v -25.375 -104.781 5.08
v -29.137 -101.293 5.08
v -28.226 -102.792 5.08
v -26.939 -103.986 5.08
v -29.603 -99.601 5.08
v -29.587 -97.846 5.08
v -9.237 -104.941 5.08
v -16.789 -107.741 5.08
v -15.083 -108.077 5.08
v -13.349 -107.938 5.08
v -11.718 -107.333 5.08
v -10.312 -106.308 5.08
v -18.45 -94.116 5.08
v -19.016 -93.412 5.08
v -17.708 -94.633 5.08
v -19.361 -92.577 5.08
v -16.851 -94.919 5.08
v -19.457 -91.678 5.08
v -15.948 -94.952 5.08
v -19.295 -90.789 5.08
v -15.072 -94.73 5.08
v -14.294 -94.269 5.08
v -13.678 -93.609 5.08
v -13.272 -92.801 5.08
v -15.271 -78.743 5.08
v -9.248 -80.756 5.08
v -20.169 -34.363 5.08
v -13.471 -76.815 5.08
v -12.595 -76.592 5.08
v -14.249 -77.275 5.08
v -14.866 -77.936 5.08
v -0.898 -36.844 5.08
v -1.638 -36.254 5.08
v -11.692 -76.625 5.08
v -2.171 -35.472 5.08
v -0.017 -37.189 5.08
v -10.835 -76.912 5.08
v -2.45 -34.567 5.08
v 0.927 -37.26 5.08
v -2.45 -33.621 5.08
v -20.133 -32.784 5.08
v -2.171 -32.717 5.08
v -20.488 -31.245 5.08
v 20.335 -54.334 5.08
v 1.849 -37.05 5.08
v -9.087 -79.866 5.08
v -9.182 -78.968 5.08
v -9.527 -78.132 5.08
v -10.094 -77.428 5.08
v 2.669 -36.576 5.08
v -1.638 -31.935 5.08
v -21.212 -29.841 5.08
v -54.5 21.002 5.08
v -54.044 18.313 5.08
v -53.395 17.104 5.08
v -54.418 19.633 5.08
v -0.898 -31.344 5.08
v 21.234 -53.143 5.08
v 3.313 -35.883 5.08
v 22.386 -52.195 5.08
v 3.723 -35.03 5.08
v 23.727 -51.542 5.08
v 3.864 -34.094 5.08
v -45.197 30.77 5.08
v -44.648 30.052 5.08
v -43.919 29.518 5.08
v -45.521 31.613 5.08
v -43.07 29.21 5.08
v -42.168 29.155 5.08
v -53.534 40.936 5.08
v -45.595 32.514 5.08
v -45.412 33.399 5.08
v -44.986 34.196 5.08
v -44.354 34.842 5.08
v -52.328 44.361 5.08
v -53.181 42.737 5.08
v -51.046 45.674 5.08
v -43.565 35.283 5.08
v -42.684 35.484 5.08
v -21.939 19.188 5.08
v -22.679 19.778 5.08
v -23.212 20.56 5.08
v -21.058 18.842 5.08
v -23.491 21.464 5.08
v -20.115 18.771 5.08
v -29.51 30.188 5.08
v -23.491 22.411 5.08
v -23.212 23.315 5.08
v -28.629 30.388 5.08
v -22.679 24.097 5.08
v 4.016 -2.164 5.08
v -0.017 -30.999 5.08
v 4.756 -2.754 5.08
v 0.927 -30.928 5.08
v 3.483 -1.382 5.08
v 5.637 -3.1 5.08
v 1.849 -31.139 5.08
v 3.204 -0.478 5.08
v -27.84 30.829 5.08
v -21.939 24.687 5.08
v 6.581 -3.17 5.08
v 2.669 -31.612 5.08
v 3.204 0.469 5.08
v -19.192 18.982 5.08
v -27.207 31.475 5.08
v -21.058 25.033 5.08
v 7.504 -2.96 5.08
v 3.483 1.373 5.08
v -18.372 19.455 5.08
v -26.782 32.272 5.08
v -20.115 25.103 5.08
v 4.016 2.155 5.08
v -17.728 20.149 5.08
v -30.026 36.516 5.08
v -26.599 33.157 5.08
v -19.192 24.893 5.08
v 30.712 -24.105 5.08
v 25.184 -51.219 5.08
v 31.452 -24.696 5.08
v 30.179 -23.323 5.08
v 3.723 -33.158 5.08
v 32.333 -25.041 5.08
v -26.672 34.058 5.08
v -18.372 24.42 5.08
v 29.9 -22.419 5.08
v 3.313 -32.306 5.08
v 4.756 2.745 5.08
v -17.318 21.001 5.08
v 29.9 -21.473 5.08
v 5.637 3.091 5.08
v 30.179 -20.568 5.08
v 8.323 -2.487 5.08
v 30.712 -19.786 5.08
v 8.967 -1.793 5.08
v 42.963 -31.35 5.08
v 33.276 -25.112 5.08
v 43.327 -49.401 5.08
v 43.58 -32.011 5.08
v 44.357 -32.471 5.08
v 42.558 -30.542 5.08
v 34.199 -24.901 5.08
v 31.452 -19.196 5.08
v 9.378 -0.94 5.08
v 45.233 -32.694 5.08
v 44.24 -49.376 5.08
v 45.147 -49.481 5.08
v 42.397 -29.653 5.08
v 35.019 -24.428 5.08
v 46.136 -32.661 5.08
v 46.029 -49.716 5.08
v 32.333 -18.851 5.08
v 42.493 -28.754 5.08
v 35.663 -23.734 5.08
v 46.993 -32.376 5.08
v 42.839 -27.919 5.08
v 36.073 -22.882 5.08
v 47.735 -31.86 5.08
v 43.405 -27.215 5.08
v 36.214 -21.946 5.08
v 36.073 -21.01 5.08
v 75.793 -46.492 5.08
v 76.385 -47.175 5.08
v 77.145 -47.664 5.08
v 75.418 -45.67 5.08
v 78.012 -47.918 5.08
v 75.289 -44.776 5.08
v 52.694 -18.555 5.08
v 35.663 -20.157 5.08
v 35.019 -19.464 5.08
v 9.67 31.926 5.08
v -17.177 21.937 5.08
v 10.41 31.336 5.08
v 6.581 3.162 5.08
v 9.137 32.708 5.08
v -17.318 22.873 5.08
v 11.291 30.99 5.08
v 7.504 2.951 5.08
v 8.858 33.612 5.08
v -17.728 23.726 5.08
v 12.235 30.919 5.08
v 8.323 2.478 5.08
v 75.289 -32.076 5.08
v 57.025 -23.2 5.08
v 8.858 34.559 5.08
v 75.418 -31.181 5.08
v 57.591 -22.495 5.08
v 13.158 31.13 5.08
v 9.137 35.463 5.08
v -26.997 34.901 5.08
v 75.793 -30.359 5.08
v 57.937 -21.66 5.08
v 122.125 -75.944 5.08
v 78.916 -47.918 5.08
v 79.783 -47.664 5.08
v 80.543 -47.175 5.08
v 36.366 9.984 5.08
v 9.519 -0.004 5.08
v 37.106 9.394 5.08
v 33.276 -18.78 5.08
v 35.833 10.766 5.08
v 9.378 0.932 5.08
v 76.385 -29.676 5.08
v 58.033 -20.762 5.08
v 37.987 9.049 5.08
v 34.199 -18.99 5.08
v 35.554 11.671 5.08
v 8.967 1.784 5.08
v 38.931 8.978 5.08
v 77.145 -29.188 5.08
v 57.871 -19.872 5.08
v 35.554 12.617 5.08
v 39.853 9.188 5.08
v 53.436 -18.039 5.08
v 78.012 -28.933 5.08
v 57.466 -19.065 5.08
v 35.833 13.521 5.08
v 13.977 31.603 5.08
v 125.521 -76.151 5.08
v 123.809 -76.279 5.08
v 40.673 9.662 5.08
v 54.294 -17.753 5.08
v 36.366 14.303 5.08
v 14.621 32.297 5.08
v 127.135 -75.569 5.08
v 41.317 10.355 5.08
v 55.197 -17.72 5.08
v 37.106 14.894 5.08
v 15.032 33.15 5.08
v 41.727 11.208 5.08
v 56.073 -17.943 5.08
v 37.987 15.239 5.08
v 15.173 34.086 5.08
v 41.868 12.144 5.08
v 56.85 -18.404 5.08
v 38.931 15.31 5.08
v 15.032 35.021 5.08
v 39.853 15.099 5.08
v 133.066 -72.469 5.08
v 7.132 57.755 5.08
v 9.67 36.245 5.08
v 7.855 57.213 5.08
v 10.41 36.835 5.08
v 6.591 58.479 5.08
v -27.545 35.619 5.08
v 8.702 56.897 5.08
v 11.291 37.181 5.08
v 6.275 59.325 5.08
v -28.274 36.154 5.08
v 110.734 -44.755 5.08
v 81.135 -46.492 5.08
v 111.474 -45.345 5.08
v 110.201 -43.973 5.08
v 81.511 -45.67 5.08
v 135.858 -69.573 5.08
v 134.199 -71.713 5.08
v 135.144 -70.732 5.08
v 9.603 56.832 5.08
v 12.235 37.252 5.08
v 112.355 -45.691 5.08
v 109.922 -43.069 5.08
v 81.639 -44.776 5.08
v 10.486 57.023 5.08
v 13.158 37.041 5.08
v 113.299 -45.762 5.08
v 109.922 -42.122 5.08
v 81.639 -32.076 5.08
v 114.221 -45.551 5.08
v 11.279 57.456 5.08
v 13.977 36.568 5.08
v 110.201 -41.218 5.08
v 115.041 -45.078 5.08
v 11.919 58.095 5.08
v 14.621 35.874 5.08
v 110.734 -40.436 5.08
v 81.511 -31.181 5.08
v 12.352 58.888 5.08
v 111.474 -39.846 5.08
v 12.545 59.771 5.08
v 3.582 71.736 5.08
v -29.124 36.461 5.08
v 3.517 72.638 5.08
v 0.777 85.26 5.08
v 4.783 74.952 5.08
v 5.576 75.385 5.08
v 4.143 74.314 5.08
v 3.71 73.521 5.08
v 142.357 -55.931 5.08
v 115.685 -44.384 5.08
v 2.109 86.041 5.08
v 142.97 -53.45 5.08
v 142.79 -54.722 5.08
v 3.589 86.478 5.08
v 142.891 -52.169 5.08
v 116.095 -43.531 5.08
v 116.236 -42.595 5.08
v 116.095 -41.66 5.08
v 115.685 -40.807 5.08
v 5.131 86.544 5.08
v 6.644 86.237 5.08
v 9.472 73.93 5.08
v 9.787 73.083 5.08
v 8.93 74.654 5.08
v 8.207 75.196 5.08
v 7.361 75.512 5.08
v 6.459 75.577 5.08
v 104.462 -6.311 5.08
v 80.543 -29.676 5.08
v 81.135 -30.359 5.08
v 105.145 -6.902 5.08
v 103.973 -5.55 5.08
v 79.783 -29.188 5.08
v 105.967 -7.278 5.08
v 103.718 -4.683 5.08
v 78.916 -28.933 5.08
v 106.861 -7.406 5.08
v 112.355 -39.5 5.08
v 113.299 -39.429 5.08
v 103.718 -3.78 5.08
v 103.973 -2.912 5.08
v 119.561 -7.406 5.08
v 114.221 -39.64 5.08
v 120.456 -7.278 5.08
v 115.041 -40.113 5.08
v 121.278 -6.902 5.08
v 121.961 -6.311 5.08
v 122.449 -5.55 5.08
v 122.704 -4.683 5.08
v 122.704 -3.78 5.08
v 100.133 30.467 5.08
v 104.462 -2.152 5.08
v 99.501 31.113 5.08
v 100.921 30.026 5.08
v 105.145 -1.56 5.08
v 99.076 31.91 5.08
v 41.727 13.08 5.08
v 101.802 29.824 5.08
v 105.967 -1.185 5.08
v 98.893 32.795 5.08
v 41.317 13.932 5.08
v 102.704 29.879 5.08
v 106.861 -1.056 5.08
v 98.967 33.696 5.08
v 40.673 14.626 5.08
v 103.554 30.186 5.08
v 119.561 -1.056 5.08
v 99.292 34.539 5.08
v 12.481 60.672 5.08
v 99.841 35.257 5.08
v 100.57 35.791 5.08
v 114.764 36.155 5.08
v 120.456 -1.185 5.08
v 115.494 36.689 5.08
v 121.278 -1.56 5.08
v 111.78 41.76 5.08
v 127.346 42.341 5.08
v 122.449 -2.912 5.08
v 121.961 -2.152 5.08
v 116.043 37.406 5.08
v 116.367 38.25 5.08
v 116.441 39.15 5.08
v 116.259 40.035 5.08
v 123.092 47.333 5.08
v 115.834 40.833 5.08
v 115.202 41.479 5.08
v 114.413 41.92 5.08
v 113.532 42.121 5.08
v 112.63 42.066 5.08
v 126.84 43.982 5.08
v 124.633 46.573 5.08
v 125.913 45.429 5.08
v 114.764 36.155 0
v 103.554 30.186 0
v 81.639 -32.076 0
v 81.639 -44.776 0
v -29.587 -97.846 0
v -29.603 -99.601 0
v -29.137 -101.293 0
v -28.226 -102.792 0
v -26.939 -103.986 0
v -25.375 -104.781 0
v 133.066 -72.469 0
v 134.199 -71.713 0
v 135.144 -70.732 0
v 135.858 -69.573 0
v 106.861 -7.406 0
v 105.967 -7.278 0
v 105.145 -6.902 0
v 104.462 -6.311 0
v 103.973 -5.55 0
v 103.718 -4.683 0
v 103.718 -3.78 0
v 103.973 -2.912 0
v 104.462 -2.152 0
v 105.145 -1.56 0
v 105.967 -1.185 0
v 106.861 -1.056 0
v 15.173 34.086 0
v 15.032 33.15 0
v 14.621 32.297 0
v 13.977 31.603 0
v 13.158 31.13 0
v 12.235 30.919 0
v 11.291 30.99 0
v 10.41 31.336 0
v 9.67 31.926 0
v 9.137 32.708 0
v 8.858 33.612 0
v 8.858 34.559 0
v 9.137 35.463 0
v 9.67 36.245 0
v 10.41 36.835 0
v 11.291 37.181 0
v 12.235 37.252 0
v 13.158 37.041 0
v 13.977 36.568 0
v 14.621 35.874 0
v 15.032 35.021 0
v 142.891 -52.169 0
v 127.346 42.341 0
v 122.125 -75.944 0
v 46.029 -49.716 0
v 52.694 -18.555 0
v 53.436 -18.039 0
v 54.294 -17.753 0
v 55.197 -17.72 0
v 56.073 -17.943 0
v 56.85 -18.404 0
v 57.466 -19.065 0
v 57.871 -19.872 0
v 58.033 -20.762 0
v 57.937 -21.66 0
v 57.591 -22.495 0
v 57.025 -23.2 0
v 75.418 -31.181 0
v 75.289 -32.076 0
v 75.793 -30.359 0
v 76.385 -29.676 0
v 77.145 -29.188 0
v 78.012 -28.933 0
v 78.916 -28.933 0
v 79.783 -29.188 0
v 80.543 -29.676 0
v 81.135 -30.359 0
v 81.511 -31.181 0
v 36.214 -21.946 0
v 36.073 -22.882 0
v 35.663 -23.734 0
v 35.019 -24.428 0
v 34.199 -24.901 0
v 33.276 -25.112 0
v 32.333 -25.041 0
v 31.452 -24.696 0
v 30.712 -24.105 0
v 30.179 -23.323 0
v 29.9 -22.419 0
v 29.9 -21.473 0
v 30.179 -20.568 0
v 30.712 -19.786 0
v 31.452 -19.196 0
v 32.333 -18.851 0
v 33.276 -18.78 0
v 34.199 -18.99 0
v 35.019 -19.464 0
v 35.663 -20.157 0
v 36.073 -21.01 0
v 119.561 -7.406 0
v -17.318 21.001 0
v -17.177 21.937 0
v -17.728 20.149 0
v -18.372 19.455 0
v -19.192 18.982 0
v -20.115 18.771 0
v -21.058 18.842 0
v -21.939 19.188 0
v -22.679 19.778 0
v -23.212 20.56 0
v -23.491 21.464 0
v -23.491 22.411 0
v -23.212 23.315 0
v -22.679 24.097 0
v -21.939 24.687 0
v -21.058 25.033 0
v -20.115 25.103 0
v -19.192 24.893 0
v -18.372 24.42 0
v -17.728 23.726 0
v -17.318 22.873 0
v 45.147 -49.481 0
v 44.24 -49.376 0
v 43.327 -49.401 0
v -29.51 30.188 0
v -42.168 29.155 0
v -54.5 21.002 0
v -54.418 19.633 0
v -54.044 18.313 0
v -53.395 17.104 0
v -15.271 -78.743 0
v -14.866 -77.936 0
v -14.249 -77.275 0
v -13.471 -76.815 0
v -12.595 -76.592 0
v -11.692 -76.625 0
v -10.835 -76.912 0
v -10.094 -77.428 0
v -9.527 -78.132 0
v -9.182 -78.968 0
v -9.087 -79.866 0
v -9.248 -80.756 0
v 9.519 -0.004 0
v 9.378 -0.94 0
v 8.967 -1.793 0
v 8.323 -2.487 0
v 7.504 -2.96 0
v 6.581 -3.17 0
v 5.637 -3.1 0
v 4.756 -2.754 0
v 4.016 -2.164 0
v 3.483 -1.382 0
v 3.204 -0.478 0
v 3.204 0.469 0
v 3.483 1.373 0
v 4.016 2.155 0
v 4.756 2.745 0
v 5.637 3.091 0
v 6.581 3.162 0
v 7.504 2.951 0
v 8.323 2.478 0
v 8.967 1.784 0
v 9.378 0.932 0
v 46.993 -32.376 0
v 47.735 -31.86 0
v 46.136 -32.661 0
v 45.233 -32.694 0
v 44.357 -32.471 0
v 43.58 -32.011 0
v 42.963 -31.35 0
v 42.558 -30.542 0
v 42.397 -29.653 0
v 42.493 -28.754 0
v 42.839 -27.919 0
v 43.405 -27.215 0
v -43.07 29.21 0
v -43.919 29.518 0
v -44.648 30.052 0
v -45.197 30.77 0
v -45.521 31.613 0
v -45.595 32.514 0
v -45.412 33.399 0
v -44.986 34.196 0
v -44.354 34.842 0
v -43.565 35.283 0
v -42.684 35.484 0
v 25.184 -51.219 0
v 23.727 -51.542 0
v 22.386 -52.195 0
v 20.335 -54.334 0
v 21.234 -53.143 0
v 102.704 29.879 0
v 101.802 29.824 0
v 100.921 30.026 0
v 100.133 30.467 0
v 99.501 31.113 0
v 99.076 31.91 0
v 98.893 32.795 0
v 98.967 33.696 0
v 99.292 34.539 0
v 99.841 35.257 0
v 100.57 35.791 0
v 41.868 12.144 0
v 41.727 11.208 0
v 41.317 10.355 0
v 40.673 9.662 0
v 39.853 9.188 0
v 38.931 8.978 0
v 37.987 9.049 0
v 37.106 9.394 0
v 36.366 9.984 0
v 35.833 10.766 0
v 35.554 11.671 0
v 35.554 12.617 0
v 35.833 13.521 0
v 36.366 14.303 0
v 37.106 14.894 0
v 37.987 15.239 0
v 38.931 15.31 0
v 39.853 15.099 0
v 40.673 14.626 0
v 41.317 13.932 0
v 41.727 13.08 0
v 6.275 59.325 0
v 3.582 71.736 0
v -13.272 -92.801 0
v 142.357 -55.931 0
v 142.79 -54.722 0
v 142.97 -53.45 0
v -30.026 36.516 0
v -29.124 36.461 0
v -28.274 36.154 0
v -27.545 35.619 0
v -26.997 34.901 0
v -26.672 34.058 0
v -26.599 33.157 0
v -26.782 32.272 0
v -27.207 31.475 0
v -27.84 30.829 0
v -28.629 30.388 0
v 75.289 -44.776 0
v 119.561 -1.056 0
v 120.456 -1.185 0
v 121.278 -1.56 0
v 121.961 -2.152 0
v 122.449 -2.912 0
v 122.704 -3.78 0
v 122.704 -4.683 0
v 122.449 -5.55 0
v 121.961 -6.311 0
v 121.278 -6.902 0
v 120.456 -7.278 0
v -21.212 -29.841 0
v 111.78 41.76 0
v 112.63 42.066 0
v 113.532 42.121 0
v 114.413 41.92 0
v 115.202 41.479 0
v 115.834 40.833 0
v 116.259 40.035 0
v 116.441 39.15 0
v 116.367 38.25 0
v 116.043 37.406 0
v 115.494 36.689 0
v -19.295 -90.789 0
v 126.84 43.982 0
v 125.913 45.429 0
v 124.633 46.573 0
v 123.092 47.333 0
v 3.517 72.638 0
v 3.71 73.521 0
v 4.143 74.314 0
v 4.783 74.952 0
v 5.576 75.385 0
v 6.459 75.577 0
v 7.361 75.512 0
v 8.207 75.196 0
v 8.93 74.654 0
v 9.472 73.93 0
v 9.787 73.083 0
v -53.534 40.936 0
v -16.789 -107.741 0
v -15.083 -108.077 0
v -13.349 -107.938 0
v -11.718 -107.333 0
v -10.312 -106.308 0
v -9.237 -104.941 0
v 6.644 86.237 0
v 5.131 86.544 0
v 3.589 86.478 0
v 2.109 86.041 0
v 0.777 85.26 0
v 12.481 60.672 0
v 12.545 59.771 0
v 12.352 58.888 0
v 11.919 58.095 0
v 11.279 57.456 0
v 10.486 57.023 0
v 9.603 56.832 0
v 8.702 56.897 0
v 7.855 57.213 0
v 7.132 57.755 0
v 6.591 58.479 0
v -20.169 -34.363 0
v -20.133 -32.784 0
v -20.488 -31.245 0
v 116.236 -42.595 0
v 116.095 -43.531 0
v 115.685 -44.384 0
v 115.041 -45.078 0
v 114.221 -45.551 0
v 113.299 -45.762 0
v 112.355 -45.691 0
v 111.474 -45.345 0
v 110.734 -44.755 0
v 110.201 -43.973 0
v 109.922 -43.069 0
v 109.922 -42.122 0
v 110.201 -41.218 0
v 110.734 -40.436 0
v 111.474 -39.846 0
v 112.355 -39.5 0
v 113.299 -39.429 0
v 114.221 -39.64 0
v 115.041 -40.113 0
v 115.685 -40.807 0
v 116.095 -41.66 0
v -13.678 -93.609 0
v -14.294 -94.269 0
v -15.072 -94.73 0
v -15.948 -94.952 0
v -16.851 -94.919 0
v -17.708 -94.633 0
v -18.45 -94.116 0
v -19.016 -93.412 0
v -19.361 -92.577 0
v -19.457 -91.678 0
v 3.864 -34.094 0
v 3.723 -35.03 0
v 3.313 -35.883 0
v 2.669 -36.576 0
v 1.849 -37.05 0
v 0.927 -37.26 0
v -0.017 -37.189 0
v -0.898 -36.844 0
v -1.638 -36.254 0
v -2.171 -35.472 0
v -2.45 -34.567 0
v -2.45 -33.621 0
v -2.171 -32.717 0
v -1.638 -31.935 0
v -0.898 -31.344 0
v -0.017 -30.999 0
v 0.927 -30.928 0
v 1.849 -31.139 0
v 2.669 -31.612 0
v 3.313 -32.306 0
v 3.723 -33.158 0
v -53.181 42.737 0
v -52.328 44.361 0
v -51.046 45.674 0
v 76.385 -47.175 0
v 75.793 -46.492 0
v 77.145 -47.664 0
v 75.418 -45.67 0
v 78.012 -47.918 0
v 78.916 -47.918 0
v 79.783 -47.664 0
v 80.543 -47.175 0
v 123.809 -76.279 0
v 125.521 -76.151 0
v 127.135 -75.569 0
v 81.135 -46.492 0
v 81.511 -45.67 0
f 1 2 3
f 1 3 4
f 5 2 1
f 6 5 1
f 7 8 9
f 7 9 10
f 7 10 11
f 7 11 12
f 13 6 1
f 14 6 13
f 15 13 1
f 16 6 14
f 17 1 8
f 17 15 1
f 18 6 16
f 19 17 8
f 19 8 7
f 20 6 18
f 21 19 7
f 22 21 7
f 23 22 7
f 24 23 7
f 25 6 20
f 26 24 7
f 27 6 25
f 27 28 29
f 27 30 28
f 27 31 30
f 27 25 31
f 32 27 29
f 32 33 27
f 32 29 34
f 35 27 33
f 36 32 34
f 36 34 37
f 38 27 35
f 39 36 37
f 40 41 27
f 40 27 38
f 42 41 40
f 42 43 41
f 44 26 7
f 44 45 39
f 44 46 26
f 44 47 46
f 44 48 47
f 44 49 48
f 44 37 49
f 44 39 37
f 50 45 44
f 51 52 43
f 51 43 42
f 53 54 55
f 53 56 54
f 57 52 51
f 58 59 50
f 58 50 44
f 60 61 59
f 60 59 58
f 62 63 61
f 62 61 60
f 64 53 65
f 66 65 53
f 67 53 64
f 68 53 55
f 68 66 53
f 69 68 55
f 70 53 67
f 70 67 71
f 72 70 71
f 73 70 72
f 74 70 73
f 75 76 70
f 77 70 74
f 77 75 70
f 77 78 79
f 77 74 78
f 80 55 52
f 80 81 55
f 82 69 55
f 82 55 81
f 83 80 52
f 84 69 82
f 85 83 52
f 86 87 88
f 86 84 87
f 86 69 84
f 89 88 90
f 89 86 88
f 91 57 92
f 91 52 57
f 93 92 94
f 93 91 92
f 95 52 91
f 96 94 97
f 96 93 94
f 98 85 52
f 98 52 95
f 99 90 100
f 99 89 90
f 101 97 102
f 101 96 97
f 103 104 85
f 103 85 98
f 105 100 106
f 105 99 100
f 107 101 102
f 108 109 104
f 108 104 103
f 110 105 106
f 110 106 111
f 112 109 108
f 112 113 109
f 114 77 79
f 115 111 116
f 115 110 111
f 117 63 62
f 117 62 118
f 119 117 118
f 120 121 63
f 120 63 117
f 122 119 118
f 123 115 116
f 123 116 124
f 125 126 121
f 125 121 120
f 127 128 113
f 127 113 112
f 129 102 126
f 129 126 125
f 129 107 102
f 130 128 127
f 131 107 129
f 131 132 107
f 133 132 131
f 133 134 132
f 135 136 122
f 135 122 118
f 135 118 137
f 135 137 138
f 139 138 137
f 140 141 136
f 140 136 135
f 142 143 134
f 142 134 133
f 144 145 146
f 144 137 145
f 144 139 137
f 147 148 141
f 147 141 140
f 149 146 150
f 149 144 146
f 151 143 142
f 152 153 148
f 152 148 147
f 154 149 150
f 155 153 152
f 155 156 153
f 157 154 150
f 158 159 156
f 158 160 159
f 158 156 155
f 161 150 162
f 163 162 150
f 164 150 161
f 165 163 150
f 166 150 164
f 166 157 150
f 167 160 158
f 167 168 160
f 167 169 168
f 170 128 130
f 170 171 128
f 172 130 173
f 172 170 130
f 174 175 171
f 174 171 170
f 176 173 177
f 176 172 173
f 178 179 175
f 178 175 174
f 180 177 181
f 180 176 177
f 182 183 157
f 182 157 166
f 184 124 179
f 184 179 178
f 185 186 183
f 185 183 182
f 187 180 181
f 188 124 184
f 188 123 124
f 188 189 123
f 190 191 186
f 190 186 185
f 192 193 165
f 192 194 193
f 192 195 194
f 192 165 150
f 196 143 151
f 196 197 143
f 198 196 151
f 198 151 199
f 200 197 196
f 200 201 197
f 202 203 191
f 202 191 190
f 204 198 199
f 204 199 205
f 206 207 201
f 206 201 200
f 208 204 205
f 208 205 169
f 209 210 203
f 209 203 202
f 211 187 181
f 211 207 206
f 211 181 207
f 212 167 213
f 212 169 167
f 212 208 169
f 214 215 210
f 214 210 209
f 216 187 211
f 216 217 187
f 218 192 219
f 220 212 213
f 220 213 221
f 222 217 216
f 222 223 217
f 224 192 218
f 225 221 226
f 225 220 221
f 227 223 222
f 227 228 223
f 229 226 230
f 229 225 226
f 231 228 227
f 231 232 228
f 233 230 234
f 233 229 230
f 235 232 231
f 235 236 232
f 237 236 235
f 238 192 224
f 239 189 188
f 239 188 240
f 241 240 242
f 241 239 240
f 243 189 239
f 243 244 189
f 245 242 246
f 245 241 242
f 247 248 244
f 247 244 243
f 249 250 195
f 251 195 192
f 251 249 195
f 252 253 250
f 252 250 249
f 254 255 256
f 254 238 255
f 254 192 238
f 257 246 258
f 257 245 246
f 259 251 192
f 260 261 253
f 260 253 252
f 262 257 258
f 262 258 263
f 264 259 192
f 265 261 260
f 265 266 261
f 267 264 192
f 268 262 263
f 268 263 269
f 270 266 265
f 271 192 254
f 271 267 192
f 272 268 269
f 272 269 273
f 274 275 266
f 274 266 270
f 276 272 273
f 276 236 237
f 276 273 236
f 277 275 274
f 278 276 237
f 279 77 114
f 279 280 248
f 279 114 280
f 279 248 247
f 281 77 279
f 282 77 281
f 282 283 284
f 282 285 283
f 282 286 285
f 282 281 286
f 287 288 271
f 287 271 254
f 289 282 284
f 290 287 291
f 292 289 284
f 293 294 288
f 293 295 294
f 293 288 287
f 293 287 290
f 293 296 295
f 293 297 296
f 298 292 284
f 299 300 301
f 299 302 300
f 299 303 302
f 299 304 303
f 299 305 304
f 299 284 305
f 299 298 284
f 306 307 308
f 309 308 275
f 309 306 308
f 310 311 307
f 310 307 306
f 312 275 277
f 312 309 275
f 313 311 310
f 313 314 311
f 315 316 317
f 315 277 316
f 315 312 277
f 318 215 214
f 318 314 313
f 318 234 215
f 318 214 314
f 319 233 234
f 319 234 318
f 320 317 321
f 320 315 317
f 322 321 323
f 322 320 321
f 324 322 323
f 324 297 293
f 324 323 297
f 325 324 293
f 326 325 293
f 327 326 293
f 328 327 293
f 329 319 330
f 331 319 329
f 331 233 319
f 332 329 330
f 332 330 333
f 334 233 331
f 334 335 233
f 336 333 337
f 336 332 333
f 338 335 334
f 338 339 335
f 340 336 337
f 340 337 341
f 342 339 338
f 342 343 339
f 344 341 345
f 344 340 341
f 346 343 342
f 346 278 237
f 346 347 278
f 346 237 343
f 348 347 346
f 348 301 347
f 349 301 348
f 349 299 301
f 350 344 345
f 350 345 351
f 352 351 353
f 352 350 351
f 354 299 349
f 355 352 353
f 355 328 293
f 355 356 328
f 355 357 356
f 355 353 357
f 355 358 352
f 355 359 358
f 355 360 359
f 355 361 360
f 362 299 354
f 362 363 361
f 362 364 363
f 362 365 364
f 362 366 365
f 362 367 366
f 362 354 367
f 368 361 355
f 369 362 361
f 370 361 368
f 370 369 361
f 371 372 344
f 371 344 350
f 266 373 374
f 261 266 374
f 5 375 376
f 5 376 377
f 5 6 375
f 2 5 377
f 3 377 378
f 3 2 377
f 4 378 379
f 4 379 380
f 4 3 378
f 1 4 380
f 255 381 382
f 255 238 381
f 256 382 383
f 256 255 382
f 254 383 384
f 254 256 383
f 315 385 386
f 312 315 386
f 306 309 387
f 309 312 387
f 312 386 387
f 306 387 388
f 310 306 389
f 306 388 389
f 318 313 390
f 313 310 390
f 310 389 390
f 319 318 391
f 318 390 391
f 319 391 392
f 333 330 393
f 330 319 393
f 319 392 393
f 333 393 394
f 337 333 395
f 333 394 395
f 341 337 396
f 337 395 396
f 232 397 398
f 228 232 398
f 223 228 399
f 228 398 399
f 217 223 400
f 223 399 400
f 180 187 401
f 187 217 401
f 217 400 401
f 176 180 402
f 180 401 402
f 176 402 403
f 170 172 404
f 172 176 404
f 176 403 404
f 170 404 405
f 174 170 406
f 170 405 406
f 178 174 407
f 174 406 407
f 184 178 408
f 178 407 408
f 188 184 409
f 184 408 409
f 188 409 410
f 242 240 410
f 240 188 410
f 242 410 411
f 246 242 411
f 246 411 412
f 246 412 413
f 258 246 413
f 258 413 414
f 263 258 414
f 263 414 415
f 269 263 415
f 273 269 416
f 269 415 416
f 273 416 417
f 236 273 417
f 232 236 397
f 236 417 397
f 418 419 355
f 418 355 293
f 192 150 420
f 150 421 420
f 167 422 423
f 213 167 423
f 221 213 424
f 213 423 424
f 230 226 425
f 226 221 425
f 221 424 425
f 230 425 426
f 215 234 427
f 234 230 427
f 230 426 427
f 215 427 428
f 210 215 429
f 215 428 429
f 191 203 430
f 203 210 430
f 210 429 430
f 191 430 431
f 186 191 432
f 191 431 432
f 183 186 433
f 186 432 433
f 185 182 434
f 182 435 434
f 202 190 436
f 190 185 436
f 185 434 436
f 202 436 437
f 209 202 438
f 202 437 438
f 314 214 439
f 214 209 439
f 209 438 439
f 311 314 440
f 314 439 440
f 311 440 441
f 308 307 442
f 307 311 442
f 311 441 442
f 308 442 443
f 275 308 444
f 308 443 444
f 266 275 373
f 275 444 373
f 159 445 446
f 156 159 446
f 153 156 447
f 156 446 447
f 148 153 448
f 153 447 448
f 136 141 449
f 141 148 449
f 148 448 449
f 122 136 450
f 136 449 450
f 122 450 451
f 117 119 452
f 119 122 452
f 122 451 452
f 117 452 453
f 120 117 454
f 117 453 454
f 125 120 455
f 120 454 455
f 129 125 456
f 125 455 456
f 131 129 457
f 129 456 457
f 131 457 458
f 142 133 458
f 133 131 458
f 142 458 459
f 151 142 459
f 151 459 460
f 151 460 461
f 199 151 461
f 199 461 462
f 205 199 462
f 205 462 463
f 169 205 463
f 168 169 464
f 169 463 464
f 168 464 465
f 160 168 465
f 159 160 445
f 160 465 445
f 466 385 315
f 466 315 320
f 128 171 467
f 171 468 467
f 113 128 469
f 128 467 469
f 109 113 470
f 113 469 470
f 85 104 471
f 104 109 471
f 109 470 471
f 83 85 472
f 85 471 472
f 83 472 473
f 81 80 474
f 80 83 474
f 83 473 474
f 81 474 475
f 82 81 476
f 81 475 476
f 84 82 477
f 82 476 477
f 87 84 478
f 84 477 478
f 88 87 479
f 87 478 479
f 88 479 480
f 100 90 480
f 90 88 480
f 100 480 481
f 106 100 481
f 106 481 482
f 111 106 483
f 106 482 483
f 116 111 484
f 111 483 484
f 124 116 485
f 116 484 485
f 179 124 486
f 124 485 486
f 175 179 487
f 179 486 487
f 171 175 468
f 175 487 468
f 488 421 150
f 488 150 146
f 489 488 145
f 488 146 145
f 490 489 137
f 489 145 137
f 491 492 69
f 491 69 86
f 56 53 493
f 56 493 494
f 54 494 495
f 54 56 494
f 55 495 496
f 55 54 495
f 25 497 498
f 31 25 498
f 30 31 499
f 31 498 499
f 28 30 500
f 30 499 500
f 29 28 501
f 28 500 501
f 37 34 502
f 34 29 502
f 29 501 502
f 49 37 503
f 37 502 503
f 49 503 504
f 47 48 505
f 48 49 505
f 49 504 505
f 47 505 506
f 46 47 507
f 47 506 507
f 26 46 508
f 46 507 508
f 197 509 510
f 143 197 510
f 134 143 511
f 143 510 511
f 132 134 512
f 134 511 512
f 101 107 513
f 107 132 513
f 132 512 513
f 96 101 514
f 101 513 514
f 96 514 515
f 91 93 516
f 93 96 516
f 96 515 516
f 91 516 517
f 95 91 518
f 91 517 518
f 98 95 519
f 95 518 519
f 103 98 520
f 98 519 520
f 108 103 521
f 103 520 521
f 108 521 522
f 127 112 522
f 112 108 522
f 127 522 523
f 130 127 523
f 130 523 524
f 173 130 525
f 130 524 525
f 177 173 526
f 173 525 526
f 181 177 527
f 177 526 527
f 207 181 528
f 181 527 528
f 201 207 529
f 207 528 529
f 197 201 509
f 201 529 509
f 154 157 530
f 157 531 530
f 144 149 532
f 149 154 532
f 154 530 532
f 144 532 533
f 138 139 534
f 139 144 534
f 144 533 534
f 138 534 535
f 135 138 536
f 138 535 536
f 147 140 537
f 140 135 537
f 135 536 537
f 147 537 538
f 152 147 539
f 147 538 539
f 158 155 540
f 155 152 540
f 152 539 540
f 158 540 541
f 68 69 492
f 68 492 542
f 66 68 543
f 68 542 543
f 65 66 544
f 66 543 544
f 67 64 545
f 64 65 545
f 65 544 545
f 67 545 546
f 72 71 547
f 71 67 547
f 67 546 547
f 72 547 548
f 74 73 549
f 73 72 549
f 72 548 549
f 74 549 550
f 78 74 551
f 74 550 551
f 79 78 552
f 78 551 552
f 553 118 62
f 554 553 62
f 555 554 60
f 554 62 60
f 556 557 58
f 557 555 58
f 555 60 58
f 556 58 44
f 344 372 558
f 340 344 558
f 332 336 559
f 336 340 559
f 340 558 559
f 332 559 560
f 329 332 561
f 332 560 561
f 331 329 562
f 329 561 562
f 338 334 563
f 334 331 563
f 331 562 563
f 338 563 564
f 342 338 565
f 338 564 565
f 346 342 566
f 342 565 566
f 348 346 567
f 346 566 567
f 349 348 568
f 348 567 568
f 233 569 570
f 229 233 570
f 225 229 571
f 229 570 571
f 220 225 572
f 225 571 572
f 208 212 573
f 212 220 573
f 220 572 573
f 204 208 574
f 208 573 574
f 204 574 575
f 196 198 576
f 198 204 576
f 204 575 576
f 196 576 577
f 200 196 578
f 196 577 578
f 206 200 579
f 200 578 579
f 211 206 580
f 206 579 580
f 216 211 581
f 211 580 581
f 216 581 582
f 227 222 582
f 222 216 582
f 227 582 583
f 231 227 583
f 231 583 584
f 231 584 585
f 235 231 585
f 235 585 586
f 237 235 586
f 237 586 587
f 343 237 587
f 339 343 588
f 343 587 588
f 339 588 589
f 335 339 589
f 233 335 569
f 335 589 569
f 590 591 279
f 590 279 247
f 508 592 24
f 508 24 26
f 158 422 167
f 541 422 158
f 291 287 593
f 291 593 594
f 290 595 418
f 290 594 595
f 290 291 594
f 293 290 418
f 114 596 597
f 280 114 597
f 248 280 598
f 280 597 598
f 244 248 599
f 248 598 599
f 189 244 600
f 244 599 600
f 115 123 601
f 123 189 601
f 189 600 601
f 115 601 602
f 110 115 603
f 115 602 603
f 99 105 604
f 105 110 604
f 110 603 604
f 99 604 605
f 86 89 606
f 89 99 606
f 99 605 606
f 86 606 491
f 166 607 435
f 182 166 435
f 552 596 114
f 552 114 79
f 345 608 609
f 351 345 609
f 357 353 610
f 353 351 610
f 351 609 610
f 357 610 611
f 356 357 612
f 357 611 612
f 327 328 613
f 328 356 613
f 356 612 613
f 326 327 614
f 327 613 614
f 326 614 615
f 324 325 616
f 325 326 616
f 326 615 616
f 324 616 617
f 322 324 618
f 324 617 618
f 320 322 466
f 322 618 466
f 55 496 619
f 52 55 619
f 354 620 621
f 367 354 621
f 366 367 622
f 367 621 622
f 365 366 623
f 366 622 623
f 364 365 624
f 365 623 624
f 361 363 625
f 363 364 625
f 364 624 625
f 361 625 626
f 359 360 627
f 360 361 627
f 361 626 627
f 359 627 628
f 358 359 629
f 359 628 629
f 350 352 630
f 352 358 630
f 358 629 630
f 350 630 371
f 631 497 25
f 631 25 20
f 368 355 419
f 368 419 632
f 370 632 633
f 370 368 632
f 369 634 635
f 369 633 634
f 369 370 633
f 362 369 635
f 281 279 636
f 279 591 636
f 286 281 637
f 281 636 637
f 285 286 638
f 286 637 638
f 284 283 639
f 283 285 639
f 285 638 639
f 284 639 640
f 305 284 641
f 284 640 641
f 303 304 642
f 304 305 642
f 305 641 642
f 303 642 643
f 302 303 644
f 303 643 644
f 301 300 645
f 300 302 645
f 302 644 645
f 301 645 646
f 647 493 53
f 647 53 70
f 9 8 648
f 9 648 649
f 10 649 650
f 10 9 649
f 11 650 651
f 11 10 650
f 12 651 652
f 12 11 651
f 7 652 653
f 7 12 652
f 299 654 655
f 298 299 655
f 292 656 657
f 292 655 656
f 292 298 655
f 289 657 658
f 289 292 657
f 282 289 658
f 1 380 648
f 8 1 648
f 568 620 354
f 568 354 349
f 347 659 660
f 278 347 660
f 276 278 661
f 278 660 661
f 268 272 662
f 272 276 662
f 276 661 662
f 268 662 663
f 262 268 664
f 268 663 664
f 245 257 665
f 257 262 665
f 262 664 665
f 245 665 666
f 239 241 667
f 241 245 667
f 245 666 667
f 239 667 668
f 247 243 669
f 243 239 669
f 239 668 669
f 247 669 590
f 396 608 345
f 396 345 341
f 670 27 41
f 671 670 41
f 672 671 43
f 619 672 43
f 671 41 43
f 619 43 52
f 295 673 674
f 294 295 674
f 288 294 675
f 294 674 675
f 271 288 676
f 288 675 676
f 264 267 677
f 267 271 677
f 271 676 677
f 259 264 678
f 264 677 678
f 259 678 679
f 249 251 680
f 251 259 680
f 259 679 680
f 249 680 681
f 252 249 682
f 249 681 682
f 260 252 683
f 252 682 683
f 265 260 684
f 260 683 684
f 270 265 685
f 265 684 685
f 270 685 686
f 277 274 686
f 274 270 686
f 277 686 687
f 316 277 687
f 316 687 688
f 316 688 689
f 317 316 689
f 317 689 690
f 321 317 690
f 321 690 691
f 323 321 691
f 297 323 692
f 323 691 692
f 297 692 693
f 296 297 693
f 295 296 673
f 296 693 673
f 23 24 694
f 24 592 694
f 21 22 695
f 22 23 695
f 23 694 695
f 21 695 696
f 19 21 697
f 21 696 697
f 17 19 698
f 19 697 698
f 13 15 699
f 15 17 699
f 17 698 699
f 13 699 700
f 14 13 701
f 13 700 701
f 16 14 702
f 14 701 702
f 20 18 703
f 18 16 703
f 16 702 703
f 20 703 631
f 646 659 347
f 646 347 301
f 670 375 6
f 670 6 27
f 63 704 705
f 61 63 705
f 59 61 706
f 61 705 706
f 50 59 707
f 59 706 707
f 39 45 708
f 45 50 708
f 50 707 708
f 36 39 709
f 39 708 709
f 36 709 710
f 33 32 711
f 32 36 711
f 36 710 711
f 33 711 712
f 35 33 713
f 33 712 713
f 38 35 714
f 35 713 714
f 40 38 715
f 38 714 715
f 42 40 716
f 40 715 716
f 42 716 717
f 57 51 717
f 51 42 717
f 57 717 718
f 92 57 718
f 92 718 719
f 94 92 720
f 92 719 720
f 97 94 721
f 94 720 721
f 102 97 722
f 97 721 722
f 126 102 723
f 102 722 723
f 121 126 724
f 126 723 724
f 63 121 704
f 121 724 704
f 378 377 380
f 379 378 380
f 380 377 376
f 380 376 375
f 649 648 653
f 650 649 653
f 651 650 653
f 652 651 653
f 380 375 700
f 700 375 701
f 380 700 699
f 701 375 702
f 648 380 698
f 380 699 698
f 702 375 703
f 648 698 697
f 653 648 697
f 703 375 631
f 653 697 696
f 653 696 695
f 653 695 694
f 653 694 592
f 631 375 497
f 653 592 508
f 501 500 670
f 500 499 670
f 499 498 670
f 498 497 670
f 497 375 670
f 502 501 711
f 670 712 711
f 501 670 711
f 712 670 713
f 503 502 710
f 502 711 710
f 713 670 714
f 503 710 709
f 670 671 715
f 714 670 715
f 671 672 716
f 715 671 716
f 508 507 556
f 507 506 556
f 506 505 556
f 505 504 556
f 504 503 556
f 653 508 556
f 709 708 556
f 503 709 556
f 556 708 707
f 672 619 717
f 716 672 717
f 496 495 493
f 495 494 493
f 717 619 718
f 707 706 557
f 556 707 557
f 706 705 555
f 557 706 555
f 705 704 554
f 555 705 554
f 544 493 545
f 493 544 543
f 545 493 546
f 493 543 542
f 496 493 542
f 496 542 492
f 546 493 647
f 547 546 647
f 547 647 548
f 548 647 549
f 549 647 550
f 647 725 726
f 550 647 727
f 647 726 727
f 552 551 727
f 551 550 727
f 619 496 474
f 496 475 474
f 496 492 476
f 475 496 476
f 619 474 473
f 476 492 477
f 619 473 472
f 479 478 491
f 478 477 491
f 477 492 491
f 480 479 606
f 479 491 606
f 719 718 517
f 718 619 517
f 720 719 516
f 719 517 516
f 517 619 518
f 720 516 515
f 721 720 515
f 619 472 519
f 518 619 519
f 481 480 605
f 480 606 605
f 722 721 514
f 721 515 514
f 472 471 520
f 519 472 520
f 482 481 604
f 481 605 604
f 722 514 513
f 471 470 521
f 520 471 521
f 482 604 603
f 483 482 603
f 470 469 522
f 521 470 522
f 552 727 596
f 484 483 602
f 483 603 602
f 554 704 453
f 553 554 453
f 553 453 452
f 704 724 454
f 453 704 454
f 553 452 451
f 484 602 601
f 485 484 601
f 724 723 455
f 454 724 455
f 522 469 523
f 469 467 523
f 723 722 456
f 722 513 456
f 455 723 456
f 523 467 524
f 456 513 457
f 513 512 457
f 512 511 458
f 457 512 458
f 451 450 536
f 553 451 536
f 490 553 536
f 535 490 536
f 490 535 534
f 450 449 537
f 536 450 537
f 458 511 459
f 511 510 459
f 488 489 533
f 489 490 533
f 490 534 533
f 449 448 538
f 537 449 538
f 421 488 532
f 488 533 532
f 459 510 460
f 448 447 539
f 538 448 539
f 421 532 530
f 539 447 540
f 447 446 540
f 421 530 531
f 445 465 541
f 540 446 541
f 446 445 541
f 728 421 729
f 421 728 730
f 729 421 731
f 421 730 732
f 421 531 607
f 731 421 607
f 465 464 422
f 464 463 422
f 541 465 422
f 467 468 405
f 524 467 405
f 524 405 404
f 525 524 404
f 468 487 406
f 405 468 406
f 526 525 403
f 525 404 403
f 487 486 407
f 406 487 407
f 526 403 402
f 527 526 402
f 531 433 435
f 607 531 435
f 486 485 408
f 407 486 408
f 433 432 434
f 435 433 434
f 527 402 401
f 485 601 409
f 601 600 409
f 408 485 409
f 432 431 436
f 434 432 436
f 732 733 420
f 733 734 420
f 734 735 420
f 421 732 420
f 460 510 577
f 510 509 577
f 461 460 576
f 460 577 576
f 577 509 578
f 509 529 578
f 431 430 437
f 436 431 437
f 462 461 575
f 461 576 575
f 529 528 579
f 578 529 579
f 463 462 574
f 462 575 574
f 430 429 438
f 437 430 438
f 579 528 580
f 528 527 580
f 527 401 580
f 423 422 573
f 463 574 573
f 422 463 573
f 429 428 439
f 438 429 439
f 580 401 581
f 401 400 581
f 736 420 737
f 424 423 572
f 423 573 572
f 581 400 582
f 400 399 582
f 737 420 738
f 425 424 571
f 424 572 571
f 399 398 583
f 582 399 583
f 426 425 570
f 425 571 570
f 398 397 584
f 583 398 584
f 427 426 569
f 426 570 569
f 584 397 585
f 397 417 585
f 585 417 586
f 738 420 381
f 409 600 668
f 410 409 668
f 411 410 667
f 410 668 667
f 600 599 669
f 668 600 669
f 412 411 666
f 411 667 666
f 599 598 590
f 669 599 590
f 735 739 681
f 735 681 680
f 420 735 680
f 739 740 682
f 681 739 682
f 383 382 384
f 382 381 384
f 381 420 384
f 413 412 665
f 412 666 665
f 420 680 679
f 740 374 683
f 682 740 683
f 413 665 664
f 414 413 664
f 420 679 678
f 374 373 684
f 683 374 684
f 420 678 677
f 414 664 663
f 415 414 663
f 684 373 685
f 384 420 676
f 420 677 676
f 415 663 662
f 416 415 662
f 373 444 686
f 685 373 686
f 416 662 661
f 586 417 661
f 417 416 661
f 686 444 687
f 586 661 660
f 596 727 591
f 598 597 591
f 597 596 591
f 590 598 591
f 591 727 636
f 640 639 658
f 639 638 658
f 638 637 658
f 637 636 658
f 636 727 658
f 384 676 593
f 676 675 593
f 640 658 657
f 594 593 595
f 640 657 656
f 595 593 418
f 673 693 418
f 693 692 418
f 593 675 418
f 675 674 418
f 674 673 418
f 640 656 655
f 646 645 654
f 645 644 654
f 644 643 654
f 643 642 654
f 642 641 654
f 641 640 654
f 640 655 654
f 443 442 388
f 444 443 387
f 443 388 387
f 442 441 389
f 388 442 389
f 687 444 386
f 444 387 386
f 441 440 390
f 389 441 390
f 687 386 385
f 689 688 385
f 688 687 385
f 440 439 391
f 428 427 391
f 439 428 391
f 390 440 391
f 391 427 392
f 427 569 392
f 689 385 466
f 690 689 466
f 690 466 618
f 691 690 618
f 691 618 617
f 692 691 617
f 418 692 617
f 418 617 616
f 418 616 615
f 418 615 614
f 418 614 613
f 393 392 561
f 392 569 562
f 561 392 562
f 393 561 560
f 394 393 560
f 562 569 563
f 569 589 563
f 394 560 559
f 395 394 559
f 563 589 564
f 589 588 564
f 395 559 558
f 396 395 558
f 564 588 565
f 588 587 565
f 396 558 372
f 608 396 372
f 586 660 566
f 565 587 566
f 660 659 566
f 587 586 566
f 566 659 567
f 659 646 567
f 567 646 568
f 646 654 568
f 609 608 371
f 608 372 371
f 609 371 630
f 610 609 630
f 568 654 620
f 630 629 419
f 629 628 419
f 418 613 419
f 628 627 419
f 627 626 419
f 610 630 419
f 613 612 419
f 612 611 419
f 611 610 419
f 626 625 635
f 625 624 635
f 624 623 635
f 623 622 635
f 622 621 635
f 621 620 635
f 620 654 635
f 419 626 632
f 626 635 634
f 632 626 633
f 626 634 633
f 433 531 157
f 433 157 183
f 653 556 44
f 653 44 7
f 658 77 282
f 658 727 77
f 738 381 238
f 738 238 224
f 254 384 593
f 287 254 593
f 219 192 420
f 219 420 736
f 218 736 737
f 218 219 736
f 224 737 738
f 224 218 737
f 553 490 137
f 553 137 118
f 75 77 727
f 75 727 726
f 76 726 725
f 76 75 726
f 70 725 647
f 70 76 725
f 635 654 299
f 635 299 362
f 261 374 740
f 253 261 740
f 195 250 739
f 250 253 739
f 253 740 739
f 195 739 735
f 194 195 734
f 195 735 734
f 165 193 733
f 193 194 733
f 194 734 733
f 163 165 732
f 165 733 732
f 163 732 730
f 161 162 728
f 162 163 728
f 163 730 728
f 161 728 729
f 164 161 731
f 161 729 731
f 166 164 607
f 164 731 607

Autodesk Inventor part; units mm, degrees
ref_plane "YZ Plane" through (0, 0, 0) normal (1, 0, 0) x (0, 1, 0)
ref_plane "XZ Plane" through (0, 0, 0) normal (0, 1, 0) x (-1, 0, 0)
ref_plane "XY Plane" through (0, 0, 0) normal (0, 0, 1) x (1, 0, 0)
sketch "Base" plane through (0, 0, 0) normal (0, 0, 1) x (1, 0, 0)
  circle A0 centre (6.3437, -0.0043) radius 44.7044
  line L0 (-53.391, 43.8831) -> (3.4518, 87.3031)
  line L1 (3.4518, 87.3031) -> (126.7242, 46.1195)
  line L2 (21.9665, -51.542) -> (-11.8651, -109.4379)
  line L3 (134.9457, -71.4872) -> (143.2137, -54.1334)
  line L4 (44.7126, -49.2622) -> (124.7112, -76.8356)
  line L5 (44.7126, -49.2622) -> (21.9665, -51.542)
  line L6 (126.7242, 46.1195) -> (143.2137, -54.1334)
  line L7 (134.9457, -71.4872) -> (124.7112, -76.8356)
  line L8 (-30.3614, -103.0627) -> (-11.8651, -109.4379)
  line L9 (-30.3614, -103.0627) -> (-19.8027, -31.8971)
  circle A1 centre (113.0613, -42.5954) radius 19.05 construction
  line L10 (-54.6035, 18.8674) -> (-53.391, 43.8831)
  line L11 (-54.6035, 18.8674) -> (-19.8027, -31.8971)
  line L12 (-94.1669, 0) -> (182.7771, 0) construction
  circle A2 centre (6.3437, -0.0043) radius 3.175
  circle A3 centre (113.0613, -42.5954) radius 3.175
  line L13 (126.7242, 46.1195) -> (-19.8027, -31.8971) construction
  line L14 (3.4518, 87.3031) -> (33.3396, -50.4021) construction
  line L15 (-53.9972, 31.3753) -> (126.7242, 46.1195) construction
  line L16 (134.969, -4.007) -> (-37.2031, -6.5149) construction
  line L17 (-21.1132, -106.2503) -> (39.5241, 75.2519) construction
  line L18 (78.4642, -60.8955) -> (78.4642, 62.2425) construction
  line L19 (21.9665, -51.542) -> (126.7242, 46.1195) construction
  line L20 (0, 0) -> (-53.391, 43.8831) construction
  circle A4 centre (-20.3518, 21.9373) radius 3.175
  circle A5 centre (6.3437, -0.0043) radius 34.5555 construction
  circle A6 centre (-26.006, -12.1525) radius 3.175
  circle A7 centre (0.6895, -34.0941) radius 3.175
  circle A8 centre (33.0392, -21.9459) radius 3.175
  circle A9 centre (38.6934, 12.1439) radius 3.175
  circle A10 centre (11.9979, 34.0855) radius 3.175
  line L21 (113.2722, 38.9571) -> (102.0622, 32.9885) construction
  line L22 (111.78, 41.7596) -> (100.57, 35.791)
  line L23 (103.5543, 30.186) -> (114.7644, 36.1546)
  arc A11 (114.7644, 36.1546) -> (111.78, 41.7596) centre (113.2722, 38.9571) ccw
  arc A12 (100.57, 35.791) -> (103.5543, 30.186) centre (102.0622, 32.9885) ccw
  line L24 (119.5611, -4.2314) -> (106.8611, -4.2314) construction
  line L25 (119.5611, -1.0564) -> (106.8611, -1.0564)
  line L26 (106.8611, -7.4064) -> (119.5611, -7.4064)
  arc A13 (119.5611, -7.4064) -> (119.5611, -1.0564) centre (119.5611, -4.2314) ccw
  arc A14 (106.8611, -1.0564) -> (106.8611, -7.4064) centre (106.8611, -4.2314) ccw
  line L27 (6.6843, 72.4098) -> (9.378, 59.9988) construction
  line L28 (3.5815, 71.7364) -> (6.2752, 59.3254)
  line L29 (12.4807, 60.6722) -> (9.787, 73.0833)
  arc A15 (9.787, 73.0833) -> (3.5815, 71.7364) centre (6.6843, 72.4098) ccw
  arc A16 (6.2752, 59.3254) -> (12.4807, 60.6722) centre (9.378, 59.9988) ccw
  line L30 (-16.2839, -91.795) -> (-12.2597, -79.7494) construction
  line L31 (-13.2725, -92.801) -> (-9.2483, -80.7555)
  line L32 (-15.271, -78.7434) -> (-19.2953, -90.7889)
  arc A17 (-19.2953, -90.7889) -> (-13.2725, -92.801) centre (-16.2839, -91.795) ccw
  arc A18 (-9.2483, -80.7555) -> (-15.271, -78.7434) centre (-12.2597, -79.7494) ccw
  line L33 (78.4642, -44.7756) -> (78.4642, -32.0756) construction
  line L34 (75.2892, -44.7756) -> (75.2892, -32.0756)
  line L35 (81.6392, -32.0756) -> (81.6392, -44.7756)
  arc A19 (75.2892, -44.7756) -> (81.6392, -44.7756) centre (78.4642, -44.7756) ccw
  arc A20 (81.6392, -32.0756) -> (75.2892, -32.0756) centre (78.4642, -32.0756) ccw
  line L36 (-42.4258, 32.3193) -> (-29.7679, 33.352) construction
  line L37 (-42.1676, 29.1548) -> (-29.5097, 30.1875)
  line L38 (-30.0261, 36.5165) -> (-42.684, 35.4838)
  arc A21 (-42.684, 35.4838) -> (-42.1676, 29.1548) centre (-42.4258, 32.3193) ccw
  arc A22 (-29.5097, 30.1875) -> (-30.0261, 36.5165) centre (-29.7679, 33.352) ccw
  line L39 (45.5702, -29.5373) -> (54.8596, -20.8771) construction
  line L40 (47.7352, -31.8596) -> (57.0246, -23.1995)
  line L41 (52.6945, -18.5548) -> (43.4052, -27.2149)
  arc A23 (43.4052, -27.2149) -> (47.7352, -31.8596) centre (45.5702, -29.5373) ccw
  arc A24 (57.0246, -23.1995) -> (52.6945, -18.5548) centre (54.8596, -20.8771) ccw
  point P0 (107.6672, 35.9728)
  point P1 (113.2111, -4.2314)
  point P2 (8.0311, 66.2043)
  point P3 (-14.2718, -85.7722)
  point P4 (78.4642, -38.4256)
  point P5 (-36.0969, 32.8357)
  point P6 (50.2149, -25.2072)
  dimension "d48" = 69.111
  dimension "d0" = 38.1
  dimension "d1" = 89.4088
  dimension "d2" = 55.568
  dimension "d3" = 37.094
  dimension "d4" = 120.3
  dimension "d5" = 81.561
  dimension "d6" = 160.982
  dimension "d7" = 133.392
  dimension "d8" = 143.066
  dimension "d9" = 145.185
  dimension "d10" = 124.151
  dimension "d11" = 130.15
  dimension "d12" = 142.793
  dimension "d13" = 117.814
  dimension "d14" = 19.5642
  dimension "d15" = 25.0158
  dimension "d16" = 71.529
  dimension "d17" = 61.5478
  dimension "d18" = 129.9699
  dimension "d19" = 101.6
  dimension "d20" = 19.2227
  dimension "d21" = 11.5477
  dimension "d22" = 84.6172
  dimension "d23" = 67.056
  dimension "d24" = 22.86
  dimension "d25" = 39.5986
  dimension "d26" = 71.1371
  dimension "d27" = 28.575
  dimension "d28" = 27.8801
  dimension "d29" = 6.35
  dimension "d30" = 6.35
  dimension "d31" = 48.26
  dimension "d32" = 6.35
  dimension "d35" = 360
  dimension "d37" = 6.35
  dimension "d38" = 6.35
  dimension "d39" = 15.24
  dimension "d40" = 12.7
  dimension "d41" = 15.24
  dimension "d43" = 15.24
  dimension "d44" = 15.24
  dimension "d45" = 15.24
  dimension "d46" = 15.7016
  dimension "d49" = 140.583
  dimension "d50" = 4.2314
  dimension "d51" = 91.5631
  dimension "d52" = 12.1439
  dimension "d53" = 0
  dimension "d54" = 30.1875
  dimension "d60" = 126.024
  dimension "d61" = 155.259
extrude "Plate1" add sketch "Base" along normal blind 5.08 contours A0 L9 L11 | A0 L11 L10 L0 L1 L6 L3 L7 L4 L5 L2 L8 L9 | A6 picked at (-0.619, 18.5381)
fillet "Fillet1" radius 6.35 12 edges at (126.7242, 46.1195, 2.54) (3.4518, 87.3031, 2.54) (143.2137, -54.1334, 2.54) (134.9457, -71.4872, 2.54) (124.7112, -76.8356, 2.54) (-11.8651, -109.4379, 2.54) (44.7126, -49.2622, 2.54) (21.9665, -51.542, 2.54) (-30.3614, -103.0627, 2.54) (-19.8027, -31.8971, 2.54) (-54.6035, 18.8674, 2.54) (-53.391, 43.8831, 2.54)
equation "\"d41\" = d39"
equation "\"d43\" = d39"
equation "\"d44\" = d43"
equation "\"d45\" = d43"
equation "\"d47\" = Thickness"
equation "\"BendRadius\" = Thickness"
equation "\"BendReliefWidth\" = Thickness"
equation "\"BendReliefDepth\" = 0.5 * Thickness"
equation "\"CornerReliefSize\" = 4 * Thickness"
equation "\"MinimumRemnant\" = 2 * Thickness"
equation "\"TransitionRadius\" = BendRadius"
equation "\"JacobiRadiusSize\" = BendRadius"
equation "\"GapSize\" = Thickness"
equation "\"Thickness\" = 5.08"
properties part number "UpperLeg2"
